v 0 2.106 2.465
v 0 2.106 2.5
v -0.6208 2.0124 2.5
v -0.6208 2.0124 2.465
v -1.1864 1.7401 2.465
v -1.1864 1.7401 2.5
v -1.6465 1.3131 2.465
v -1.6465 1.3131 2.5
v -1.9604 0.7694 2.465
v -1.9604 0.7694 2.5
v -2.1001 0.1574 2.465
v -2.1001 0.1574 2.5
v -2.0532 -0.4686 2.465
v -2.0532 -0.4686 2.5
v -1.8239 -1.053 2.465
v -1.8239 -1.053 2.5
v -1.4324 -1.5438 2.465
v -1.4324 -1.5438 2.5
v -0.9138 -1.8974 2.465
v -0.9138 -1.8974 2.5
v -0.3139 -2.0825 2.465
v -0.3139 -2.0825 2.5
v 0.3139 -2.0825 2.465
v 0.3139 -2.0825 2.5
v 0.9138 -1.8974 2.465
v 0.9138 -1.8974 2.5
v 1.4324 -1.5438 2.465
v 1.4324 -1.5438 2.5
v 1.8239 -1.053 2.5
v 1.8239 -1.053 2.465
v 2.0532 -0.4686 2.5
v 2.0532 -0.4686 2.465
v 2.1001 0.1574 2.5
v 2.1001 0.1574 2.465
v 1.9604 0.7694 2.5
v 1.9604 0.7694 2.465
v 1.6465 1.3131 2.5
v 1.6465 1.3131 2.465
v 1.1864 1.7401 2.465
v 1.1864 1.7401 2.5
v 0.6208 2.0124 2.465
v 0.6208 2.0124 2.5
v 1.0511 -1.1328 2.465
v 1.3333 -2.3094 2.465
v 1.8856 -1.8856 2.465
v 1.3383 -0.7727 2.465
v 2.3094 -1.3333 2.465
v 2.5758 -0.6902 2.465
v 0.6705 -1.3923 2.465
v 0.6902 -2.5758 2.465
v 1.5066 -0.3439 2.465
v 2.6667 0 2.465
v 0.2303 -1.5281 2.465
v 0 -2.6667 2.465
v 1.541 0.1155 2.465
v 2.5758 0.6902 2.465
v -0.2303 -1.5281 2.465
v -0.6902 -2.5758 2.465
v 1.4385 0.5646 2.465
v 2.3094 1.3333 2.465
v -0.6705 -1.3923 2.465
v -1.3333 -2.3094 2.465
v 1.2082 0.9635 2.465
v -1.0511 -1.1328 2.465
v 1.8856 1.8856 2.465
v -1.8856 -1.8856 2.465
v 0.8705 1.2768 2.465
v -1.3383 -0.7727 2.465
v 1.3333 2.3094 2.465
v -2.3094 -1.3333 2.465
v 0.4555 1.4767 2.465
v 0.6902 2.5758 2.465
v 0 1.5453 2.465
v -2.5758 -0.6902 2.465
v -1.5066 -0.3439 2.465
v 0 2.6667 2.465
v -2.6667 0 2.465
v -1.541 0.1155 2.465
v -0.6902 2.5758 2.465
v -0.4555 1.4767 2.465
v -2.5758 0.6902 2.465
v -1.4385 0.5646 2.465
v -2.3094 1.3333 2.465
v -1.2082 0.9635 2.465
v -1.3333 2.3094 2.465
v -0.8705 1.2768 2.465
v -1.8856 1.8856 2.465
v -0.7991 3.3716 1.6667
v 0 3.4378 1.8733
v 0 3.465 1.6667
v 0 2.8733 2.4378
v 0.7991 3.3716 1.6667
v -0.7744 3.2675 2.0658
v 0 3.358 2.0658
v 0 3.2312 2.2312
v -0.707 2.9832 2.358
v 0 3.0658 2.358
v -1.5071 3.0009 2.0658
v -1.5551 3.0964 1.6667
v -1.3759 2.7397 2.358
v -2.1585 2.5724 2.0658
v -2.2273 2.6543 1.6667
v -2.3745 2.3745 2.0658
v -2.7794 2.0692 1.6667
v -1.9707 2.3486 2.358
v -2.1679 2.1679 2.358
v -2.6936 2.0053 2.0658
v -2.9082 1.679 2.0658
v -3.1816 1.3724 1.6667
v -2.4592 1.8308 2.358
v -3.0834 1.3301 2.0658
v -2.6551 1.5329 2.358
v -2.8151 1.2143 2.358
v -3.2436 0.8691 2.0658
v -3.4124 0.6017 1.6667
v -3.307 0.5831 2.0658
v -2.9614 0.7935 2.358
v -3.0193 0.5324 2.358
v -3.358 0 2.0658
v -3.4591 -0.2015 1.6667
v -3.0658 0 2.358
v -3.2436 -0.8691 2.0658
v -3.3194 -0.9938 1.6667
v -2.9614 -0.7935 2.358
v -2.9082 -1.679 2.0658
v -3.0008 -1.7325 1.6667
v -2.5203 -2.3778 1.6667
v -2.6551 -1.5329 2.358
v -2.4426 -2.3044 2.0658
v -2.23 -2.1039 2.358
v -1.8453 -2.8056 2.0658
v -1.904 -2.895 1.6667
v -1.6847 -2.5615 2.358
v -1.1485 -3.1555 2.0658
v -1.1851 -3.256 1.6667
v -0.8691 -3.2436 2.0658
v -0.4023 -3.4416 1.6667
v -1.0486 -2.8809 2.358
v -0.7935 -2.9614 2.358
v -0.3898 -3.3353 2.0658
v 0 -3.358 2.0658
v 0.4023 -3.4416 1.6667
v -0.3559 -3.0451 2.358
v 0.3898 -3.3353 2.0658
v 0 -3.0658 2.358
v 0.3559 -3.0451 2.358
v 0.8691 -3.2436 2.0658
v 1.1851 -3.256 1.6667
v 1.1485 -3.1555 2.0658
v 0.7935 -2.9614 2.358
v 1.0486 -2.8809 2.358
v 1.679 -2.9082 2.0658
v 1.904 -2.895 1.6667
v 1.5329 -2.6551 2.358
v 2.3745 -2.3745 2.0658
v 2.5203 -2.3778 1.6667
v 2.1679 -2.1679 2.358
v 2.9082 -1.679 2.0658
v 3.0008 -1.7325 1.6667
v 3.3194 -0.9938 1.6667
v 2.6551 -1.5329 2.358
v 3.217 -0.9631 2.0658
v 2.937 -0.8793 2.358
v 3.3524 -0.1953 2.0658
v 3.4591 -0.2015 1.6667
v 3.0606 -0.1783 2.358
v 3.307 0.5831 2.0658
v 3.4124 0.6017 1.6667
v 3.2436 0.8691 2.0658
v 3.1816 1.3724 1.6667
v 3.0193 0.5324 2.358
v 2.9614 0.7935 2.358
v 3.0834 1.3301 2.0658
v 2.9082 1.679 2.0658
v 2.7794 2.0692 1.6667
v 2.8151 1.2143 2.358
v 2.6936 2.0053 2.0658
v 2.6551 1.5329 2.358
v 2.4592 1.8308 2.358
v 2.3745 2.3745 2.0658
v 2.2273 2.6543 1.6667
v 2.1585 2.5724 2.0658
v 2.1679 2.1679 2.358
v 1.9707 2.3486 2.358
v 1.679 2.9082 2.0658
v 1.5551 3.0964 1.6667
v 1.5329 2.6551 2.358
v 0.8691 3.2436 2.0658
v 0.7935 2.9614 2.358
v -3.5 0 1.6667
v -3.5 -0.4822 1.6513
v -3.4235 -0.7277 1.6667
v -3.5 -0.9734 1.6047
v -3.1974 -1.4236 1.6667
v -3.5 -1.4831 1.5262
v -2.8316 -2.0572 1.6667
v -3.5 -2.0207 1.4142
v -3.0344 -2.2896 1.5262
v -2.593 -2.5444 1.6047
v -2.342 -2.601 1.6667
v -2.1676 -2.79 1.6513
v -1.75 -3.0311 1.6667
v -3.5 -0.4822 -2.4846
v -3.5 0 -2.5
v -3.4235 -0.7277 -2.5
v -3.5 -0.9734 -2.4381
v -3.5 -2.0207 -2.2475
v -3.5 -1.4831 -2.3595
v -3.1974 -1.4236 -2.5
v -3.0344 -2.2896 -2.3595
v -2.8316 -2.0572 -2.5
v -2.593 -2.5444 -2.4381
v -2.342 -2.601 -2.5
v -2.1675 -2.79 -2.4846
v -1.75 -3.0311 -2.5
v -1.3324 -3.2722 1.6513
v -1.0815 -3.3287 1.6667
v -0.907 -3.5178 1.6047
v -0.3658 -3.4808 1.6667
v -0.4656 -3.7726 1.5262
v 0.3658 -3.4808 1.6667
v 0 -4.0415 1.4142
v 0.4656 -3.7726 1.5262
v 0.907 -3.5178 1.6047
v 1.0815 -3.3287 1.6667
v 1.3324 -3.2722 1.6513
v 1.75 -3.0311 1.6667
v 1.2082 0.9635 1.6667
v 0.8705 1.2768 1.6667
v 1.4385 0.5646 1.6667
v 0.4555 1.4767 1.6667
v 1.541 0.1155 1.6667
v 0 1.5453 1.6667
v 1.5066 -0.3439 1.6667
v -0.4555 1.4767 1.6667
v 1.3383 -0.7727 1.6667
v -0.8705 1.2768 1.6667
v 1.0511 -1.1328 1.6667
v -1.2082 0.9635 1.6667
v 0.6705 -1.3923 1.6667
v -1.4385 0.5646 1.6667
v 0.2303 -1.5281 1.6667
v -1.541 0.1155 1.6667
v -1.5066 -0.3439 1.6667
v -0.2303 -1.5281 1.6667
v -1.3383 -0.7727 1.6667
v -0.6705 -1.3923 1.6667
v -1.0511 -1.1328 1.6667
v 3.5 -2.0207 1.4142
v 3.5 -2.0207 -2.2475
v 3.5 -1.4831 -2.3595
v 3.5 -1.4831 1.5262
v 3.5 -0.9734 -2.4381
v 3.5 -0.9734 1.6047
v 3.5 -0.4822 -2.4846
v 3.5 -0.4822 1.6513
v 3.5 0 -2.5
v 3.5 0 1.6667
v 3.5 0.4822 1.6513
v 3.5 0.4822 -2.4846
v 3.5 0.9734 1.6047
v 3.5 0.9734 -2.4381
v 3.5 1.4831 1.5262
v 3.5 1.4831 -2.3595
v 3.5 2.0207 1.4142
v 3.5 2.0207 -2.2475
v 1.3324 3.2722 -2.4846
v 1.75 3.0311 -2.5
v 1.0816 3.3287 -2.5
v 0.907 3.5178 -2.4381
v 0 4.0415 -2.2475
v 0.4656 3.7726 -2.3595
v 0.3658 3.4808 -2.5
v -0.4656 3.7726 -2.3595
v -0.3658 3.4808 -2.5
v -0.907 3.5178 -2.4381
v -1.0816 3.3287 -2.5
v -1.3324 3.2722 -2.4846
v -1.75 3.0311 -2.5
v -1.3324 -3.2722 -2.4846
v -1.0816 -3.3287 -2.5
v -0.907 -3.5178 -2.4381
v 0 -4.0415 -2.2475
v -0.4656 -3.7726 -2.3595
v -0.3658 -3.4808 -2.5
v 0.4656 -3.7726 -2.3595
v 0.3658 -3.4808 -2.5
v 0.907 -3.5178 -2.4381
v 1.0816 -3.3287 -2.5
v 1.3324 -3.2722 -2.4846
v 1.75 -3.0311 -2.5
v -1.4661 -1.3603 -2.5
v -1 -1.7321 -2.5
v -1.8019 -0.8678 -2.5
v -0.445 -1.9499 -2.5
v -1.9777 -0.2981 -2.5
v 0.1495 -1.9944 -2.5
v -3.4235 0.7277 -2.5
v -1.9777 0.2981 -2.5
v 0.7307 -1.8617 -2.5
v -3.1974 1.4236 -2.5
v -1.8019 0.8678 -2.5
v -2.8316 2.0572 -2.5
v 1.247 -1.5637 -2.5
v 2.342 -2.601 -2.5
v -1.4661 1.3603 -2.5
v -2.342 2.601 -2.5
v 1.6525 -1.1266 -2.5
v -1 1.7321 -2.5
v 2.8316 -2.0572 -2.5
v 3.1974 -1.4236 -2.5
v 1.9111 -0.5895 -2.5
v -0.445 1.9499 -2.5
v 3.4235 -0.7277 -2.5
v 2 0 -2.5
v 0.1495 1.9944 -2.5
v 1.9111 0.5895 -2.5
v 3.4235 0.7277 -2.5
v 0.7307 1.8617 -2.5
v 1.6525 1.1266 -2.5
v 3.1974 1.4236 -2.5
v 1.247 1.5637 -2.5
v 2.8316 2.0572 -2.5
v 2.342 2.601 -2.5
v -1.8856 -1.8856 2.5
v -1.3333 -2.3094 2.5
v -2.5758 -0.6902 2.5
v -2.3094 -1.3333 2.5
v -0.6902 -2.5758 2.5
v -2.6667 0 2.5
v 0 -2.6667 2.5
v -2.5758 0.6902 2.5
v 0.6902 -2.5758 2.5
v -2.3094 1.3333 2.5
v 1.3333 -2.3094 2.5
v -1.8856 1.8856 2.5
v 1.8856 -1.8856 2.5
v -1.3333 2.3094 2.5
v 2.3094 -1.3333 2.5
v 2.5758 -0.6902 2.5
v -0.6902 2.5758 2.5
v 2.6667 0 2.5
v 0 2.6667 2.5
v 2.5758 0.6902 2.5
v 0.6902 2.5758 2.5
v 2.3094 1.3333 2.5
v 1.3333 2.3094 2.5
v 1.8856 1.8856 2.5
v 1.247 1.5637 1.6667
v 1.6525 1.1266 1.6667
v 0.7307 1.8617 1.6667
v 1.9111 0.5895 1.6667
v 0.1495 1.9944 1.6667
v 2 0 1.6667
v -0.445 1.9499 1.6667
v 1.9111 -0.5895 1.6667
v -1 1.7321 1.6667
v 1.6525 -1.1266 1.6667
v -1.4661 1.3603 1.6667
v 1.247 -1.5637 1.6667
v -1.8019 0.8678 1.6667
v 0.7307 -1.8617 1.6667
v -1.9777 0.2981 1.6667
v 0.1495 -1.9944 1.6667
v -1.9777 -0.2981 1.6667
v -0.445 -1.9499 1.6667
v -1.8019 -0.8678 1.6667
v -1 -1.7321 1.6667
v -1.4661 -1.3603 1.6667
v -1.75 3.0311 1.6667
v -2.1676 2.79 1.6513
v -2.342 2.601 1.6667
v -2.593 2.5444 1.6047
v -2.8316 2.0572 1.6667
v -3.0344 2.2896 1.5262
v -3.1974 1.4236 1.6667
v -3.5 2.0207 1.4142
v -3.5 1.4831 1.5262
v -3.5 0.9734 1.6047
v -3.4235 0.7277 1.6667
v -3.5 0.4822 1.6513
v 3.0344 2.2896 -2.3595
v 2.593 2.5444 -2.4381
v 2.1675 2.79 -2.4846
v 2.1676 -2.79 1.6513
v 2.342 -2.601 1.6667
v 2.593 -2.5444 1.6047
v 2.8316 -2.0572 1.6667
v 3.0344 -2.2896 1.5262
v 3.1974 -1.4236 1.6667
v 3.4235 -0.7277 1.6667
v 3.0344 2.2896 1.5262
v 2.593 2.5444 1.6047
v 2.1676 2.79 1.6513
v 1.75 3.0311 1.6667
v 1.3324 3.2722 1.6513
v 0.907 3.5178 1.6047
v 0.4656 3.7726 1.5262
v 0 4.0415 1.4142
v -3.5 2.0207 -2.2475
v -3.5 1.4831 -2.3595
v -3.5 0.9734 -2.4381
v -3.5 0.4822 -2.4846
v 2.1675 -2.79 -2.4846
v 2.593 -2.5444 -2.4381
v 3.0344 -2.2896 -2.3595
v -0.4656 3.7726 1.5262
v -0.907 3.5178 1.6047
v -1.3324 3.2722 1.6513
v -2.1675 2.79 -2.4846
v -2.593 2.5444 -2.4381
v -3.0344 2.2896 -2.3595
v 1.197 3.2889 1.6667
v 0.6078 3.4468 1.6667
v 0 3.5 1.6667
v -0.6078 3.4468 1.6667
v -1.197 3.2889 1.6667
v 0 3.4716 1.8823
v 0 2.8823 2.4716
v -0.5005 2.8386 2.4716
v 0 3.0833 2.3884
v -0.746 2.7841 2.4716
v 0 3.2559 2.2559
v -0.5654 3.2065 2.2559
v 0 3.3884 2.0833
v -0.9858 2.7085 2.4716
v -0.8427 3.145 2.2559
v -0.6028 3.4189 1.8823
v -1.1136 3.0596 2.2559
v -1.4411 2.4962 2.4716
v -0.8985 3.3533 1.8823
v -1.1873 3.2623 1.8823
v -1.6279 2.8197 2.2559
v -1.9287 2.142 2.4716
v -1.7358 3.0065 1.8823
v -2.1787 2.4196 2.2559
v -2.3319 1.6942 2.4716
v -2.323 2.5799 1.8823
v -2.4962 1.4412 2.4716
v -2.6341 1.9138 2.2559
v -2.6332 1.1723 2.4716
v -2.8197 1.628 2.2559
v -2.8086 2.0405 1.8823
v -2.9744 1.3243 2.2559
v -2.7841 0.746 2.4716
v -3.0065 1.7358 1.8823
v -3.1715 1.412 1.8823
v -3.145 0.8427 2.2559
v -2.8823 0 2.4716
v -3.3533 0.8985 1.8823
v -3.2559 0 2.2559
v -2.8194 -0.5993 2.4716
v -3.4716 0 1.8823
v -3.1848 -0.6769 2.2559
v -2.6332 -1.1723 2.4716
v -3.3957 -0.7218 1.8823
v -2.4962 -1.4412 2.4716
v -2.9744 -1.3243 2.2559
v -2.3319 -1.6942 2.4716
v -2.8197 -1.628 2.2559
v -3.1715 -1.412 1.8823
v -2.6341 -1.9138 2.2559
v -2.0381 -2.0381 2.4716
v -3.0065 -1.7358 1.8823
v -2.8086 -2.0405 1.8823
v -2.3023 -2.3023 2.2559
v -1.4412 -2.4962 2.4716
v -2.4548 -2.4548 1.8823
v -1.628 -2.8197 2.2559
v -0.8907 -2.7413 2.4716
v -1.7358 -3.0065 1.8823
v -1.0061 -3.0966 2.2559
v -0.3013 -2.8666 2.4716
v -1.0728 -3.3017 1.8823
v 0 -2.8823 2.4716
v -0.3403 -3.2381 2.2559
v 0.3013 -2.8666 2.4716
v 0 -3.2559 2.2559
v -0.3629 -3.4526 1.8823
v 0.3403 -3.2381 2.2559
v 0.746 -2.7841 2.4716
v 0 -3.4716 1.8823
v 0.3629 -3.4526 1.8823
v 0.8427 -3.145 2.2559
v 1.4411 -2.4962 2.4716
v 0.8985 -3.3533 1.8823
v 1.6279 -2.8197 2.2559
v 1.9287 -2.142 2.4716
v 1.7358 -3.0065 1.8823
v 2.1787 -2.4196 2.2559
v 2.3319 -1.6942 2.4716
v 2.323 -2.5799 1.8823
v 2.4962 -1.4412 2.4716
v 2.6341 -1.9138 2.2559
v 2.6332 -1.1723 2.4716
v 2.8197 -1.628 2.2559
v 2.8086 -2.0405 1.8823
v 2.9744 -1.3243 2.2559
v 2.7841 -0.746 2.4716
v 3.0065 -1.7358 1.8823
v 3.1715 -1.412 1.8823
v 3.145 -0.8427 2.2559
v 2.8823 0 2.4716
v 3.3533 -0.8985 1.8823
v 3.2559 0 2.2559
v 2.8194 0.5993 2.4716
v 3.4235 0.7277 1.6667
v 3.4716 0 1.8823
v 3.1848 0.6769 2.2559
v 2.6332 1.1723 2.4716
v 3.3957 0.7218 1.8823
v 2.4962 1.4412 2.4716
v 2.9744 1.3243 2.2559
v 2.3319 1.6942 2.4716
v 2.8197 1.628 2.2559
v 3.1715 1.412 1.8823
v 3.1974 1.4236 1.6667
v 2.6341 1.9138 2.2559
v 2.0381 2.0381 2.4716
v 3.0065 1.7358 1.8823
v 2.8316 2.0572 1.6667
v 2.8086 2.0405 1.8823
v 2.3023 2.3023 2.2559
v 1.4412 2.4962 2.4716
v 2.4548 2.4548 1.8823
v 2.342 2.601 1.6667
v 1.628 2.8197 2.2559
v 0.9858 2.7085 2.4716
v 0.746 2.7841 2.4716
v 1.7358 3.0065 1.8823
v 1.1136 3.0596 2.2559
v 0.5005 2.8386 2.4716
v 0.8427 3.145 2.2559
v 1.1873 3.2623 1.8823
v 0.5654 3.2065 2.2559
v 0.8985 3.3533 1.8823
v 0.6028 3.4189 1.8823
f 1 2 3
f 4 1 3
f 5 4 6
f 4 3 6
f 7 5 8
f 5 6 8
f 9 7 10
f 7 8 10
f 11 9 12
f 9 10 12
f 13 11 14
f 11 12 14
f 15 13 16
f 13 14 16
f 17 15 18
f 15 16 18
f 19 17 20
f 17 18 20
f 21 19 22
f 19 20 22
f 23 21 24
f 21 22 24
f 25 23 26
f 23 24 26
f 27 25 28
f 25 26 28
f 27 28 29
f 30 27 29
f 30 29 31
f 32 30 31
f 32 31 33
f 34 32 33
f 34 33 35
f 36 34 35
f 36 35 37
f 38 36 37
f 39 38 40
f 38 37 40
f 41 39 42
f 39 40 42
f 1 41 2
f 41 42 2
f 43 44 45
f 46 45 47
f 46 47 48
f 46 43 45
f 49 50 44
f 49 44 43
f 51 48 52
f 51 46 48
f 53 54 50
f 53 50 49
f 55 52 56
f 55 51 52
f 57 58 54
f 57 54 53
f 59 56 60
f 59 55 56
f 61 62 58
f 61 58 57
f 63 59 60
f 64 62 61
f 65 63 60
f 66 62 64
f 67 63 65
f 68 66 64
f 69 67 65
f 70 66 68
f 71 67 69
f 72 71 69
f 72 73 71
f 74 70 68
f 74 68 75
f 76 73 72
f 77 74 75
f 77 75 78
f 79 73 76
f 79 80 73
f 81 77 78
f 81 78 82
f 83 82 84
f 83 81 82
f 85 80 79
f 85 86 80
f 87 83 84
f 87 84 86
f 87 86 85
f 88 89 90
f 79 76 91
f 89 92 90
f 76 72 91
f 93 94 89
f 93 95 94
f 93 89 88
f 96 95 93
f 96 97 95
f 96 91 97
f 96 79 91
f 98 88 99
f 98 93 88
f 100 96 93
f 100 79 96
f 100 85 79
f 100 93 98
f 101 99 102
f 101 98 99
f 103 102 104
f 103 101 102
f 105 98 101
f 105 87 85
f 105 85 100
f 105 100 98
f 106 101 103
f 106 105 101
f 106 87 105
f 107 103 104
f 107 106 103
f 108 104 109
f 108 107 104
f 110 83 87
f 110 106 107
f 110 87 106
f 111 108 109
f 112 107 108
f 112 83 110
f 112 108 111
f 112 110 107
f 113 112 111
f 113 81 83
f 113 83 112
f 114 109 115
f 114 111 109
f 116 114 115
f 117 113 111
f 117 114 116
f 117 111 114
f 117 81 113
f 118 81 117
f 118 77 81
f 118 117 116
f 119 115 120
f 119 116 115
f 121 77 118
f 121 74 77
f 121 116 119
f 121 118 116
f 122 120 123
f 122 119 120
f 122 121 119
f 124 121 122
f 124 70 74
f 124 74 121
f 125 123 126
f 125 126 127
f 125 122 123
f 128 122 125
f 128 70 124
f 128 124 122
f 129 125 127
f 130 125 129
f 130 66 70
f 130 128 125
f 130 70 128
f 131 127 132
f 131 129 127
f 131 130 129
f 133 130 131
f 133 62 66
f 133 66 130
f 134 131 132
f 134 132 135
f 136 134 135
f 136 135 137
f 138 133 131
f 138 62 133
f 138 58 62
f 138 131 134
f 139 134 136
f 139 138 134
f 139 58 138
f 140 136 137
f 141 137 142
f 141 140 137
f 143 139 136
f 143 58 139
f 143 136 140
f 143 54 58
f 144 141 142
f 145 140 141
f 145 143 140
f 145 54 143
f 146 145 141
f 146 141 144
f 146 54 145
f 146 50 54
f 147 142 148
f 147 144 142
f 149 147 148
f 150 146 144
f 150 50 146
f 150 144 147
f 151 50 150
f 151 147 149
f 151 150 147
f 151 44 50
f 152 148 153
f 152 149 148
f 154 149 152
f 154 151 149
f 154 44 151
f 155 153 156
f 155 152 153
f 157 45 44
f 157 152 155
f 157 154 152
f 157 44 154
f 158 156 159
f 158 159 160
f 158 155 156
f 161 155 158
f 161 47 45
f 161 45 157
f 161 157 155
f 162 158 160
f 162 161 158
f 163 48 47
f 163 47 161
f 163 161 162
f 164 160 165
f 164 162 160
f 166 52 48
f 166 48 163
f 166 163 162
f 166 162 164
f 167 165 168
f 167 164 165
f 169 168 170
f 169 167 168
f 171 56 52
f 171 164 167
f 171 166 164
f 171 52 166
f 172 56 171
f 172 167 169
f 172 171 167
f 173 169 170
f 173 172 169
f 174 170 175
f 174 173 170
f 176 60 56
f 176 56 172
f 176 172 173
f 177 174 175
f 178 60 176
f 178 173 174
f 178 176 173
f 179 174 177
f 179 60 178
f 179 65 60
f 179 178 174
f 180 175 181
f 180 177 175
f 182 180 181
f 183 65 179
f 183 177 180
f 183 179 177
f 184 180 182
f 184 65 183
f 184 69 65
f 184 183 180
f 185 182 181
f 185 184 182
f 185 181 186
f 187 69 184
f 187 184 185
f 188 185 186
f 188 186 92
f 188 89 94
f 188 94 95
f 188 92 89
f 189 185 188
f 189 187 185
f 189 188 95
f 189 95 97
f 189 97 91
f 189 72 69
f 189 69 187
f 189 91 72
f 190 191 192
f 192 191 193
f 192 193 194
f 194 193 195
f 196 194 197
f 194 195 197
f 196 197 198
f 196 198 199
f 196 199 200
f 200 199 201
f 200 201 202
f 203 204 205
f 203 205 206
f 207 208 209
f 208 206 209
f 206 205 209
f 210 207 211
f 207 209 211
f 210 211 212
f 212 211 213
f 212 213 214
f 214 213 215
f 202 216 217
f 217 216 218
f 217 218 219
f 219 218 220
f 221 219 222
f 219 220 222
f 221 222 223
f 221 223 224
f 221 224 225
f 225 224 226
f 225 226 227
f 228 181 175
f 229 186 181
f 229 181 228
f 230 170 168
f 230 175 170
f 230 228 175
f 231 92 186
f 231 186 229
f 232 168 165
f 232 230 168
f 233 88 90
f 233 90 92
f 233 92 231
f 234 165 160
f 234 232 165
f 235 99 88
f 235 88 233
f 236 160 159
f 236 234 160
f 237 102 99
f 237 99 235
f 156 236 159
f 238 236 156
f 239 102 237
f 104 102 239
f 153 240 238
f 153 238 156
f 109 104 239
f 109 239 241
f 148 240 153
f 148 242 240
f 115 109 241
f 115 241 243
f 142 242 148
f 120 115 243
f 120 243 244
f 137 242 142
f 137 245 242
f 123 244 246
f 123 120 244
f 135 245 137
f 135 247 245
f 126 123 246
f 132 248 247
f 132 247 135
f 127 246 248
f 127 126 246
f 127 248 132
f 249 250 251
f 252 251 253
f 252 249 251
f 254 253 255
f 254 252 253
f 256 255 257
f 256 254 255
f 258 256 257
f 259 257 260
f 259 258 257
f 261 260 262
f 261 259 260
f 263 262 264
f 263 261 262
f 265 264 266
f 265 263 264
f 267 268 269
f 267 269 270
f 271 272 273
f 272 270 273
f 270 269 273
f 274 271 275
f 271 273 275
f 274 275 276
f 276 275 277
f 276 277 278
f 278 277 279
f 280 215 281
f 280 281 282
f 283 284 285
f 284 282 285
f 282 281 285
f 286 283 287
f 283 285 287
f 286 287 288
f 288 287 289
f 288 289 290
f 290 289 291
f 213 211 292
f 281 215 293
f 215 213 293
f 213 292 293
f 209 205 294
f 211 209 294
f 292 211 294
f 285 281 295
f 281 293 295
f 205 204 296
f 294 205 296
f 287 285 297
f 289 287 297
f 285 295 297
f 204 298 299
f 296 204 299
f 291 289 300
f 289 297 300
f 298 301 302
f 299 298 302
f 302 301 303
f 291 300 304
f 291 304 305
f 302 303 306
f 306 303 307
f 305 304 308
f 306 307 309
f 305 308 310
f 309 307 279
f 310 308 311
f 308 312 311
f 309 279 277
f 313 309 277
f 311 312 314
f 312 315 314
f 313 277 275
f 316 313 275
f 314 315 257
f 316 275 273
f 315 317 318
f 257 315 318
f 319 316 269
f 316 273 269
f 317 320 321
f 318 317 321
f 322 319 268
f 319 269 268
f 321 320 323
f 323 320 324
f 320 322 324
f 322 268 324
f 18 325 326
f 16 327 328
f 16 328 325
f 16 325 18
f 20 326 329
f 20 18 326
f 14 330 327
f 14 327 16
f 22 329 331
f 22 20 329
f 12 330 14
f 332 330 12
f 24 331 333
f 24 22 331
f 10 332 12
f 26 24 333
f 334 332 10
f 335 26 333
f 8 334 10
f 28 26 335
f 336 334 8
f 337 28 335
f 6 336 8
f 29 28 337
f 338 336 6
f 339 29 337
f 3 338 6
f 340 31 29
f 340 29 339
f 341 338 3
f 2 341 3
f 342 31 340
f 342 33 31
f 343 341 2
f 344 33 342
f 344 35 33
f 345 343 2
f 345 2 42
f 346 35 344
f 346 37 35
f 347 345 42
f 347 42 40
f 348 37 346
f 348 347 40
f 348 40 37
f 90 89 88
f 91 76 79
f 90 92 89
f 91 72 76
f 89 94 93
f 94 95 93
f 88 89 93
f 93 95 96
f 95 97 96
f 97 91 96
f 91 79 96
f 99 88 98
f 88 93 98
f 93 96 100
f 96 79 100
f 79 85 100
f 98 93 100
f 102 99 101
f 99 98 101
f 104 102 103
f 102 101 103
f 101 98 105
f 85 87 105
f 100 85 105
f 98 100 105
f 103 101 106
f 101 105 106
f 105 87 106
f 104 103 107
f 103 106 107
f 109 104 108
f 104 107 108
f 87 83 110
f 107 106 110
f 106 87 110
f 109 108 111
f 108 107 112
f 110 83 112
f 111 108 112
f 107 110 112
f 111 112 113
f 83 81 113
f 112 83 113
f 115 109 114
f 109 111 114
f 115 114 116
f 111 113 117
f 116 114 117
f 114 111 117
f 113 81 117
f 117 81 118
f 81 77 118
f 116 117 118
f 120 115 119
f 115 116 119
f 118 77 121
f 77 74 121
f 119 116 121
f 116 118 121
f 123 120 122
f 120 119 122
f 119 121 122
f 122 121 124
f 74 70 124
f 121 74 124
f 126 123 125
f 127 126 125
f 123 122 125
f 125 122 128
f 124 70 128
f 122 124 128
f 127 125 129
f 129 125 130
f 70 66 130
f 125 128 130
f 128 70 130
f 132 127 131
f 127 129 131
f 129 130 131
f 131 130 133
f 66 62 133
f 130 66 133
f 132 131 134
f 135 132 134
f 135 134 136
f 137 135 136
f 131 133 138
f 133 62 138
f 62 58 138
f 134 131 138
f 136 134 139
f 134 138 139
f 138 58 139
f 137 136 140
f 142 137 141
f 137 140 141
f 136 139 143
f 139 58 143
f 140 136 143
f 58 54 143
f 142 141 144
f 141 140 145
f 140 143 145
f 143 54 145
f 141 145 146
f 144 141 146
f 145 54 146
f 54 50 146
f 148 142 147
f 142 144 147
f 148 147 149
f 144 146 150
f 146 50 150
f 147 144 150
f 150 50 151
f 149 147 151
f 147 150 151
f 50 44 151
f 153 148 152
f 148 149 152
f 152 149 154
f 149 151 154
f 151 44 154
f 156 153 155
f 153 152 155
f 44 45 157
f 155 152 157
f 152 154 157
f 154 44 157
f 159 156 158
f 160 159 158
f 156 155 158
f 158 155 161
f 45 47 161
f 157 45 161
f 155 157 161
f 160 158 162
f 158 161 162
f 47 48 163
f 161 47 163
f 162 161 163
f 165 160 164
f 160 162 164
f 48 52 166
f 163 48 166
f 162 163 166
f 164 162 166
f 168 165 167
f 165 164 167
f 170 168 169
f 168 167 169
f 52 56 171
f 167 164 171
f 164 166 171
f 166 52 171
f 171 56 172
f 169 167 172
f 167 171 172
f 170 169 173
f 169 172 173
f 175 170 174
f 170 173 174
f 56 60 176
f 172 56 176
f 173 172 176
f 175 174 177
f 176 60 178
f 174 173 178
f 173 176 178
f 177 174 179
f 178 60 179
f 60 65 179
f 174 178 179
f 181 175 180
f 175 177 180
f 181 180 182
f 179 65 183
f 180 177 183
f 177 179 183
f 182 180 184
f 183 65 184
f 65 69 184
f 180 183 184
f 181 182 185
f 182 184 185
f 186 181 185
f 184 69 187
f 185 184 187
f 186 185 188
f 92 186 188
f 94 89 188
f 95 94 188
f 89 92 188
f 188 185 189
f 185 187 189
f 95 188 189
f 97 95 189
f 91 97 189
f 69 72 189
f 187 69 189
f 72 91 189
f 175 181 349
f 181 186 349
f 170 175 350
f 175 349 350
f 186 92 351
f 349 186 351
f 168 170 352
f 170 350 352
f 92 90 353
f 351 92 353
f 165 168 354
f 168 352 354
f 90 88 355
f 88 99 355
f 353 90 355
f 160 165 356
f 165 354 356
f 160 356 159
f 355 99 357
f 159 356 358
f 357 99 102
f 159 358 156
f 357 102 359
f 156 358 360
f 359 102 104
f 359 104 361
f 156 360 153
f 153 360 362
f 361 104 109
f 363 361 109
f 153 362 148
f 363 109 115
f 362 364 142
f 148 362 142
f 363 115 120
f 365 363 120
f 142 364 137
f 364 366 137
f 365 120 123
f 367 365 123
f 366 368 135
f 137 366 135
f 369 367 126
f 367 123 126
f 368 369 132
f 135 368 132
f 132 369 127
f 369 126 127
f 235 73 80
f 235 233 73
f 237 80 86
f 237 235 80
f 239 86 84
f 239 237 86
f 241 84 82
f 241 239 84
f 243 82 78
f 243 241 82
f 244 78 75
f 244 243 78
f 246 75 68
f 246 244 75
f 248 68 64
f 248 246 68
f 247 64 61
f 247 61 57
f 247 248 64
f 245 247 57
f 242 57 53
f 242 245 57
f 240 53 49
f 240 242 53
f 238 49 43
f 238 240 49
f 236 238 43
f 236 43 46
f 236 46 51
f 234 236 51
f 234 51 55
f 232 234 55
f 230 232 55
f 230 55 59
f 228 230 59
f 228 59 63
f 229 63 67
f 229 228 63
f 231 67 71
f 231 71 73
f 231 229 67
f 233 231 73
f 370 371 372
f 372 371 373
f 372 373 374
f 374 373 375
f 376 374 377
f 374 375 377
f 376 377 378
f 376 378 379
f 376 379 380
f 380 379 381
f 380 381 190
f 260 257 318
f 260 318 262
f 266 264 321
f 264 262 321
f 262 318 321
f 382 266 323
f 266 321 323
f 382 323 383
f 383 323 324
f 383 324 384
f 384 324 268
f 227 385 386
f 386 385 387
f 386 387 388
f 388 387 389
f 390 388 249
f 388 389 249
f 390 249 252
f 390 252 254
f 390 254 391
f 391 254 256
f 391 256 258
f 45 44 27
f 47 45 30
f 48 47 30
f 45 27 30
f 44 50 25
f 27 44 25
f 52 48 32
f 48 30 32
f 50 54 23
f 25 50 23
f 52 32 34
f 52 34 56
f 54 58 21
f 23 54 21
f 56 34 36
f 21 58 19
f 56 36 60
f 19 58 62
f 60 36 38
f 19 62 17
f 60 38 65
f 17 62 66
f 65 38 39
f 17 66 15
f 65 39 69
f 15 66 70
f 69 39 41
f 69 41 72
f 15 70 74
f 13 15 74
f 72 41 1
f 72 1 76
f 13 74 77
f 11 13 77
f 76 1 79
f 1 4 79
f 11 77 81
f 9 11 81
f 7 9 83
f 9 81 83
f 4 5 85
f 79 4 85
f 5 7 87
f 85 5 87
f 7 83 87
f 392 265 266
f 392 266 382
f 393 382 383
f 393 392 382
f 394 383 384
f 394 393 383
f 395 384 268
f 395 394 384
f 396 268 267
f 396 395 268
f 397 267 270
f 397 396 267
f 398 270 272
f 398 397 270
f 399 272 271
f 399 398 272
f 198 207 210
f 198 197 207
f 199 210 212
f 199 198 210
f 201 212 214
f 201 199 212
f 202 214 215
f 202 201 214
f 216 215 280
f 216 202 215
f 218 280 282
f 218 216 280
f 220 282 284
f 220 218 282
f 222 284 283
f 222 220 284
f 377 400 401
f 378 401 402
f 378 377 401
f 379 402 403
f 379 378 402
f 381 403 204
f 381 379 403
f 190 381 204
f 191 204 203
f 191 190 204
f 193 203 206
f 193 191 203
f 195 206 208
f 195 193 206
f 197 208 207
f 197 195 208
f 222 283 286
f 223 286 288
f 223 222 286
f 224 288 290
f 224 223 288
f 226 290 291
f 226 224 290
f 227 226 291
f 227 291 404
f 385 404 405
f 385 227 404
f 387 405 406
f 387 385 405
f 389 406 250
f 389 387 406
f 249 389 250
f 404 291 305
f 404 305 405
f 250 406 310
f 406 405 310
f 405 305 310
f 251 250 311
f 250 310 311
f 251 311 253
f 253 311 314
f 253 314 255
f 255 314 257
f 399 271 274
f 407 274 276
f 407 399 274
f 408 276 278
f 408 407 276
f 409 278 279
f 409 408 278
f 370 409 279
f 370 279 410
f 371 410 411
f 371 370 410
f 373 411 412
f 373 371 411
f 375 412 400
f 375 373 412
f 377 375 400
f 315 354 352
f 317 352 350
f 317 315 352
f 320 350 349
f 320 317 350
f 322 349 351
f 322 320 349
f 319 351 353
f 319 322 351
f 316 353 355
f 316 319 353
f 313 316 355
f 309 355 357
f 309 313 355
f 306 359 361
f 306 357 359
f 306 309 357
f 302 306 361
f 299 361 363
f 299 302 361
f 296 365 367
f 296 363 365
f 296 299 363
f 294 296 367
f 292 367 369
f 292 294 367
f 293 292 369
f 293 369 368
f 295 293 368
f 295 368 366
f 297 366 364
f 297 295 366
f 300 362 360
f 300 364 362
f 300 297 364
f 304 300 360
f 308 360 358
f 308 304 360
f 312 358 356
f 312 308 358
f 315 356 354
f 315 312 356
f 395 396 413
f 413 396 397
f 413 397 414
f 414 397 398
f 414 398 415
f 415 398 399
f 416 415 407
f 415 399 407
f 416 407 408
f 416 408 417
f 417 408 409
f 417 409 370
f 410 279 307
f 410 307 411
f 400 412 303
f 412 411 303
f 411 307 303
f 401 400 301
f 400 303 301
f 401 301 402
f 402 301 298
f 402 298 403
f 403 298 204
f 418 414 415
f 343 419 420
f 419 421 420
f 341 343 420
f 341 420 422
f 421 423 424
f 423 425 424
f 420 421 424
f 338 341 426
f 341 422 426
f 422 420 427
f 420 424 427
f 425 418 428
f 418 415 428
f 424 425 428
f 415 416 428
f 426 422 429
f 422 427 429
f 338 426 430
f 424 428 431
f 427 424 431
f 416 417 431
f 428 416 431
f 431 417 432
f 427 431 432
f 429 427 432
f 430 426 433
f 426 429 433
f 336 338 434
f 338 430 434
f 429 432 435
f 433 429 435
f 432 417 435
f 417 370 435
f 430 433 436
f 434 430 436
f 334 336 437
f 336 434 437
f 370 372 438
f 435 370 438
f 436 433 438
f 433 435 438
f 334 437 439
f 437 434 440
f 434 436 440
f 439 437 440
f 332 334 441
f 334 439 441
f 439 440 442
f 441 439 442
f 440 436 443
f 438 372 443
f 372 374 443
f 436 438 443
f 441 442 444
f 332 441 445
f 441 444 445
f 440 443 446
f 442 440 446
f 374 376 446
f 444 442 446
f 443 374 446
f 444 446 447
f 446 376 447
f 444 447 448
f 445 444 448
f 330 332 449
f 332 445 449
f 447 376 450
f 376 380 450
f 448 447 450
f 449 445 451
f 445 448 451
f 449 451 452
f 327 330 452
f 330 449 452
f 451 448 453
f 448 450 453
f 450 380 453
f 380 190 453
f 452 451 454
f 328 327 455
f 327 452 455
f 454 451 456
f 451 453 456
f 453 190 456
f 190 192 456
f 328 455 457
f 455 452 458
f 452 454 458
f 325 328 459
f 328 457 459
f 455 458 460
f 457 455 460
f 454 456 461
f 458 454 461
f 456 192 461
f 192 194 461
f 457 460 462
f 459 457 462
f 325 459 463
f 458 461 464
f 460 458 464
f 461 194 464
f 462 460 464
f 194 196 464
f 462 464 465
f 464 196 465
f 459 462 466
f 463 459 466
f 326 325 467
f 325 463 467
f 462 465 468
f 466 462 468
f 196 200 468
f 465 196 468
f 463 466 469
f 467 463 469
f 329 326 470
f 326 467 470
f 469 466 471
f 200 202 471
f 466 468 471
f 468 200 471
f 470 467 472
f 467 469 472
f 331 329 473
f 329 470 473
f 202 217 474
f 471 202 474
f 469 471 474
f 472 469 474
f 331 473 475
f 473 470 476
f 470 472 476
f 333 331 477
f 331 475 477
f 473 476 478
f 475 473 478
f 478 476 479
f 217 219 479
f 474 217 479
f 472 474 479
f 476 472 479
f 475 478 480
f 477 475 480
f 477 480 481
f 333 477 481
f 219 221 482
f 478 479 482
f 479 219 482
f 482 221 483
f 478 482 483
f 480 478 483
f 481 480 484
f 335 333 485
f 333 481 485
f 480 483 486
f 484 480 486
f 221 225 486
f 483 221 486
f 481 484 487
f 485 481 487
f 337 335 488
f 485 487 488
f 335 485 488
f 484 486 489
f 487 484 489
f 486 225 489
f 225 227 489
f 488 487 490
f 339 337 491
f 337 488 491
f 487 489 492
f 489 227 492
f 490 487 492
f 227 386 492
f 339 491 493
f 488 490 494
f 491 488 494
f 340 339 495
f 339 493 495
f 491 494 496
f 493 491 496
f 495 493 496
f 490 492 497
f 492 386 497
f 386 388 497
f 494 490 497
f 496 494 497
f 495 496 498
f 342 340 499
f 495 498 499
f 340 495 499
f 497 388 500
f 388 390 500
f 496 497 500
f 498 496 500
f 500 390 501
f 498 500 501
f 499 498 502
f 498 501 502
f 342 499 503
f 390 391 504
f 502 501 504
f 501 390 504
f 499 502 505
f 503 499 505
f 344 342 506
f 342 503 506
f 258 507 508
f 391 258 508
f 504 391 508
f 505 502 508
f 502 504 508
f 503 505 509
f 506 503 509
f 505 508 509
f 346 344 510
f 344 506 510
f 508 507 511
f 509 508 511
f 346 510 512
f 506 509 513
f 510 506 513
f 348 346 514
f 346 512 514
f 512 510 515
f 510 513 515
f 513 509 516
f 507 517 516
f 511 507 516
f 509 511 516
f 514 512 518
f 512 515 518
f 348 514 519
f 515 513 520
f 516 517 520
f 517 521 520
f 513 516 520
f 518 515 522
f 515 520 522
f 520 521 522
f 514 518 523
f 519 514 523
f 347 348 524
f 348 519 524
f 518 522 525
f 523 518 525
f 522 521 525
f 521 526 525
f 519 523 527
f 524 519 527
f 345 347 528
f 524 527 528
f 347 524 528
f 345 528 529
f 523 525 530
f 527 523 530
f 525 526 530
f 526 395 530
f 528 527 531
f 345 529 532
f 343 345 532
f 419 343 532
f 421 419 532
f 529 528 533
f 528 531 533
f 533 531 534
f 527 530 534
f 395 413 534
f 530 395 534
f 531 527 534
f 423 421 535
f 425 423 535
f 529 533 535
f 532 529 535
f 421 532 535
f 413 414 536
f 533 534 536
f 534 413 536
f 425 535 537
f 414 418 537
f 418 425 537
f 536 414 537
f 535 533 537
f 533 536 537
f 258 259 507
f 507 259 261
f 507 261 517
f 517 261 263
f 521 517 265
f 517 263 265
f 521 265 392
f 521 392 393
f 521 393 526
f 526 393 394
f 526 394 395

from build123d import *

# Parameters (mm, degrees)
SKETCH3_R           = 2
BOSS_EXTRUDE1_DEPTH = 2.5


with BuildPart() as part:
    # Sketch3 → Boss-Extrude1 (new body, symmetric)
    with BuildSketch(Plane.XY):
        Polygon((0, -4.041451884), (3.5, -2.020725942), (3.5, 2.020725942), (0, 4.041451884), (-3.5, 2.020725942), (-3.5, -2.020725942), align=None)
        Circle(SKETCH3_R, mode=Mode.SUBTRACT)
    extrude(amount=BOSS_EXTRUDE1_DEPTH, both=True)

    # Sketch4 → Cut-Revolve1 (revolve, cut)
    with BuildSketch(Plane(origin=(0, 0, 0), x_dir=(0, 0, -1), z_dir=(1, 0, 0))):
        with BuildLine():
            Line((3.77, 5.311451884), (-3.77, 5.311451884))
            Line((-3.77, 5.311451884), (-3.77, 2.666666667))
            Line((-3.77, 2.666666667), (-2.5, 2.666666667))
            ThreePointArc((-2.5, 2.666666667), (-2.255922318, 3.255922318), (-1.666666667, 3.5))
            Line((-1.666666667, 3.5), (-1.414183506, 4.041451884))
            Line((-1.414183506, 4.041451884), (2.24751684, 4.041451884))
            Line((2.24751684, 4.041451884), (2.5, 3.5))
            Line((2.5, 3.5), (2.5, 0))
            Line((2.5, 0), (3.77, 0))
            Line((3.77, 0), (3.77, 5.311451884))
        make_face()
        with BuildLine():
            Line((-3.77, 2.106001665), (-3.77, 0))
            Line((-3.77, 0), (-1.666666667, 0))
            Line((-1.666666667, 0), (-1.666666667, 3.465))
            ThreePointArc((-1.666666667, 3.465), (-2.23117358, 3.23117358), (-2.465, 2.666666667))
            Line((-2.465, 2.666666667), (-2.465, 2.106001665))
            Line((-2.465, 2.106001665), (-3.77, 2.106001665))
        make_face()
    revolve(axis=Axis((0, 0, -2.5), (0, 0, 1)), mode=Mode.SUBTRACT)


with BuildPart() as body_2:
    # Sketch5 → Revolve1 (revolve)
    with BuildSketch(Plane(origin=(0, 0, 0), x_dir=(0, 0, -1), z_dir=(1, 0, 0))):
        with BuildLine():
            Line((-2.465, 2.666666667), (-2.465, 1.545336663))
            Line((-2.465, 1.545336663), (-1.666666667, 1.545336663))
            Line((-1.666666667, 1.545336663), (-1.666666667, 3.465))
            ThreePointArc((-1.666666667, 3.465), (-2.23117358, 3.23117358), (-2.465, 2.666666667))
        make_face()
    revolve(axis=Axis((0, 0, -2.5), (0, 0, 1)))


solid = Compound([part.part, body_2.part])
